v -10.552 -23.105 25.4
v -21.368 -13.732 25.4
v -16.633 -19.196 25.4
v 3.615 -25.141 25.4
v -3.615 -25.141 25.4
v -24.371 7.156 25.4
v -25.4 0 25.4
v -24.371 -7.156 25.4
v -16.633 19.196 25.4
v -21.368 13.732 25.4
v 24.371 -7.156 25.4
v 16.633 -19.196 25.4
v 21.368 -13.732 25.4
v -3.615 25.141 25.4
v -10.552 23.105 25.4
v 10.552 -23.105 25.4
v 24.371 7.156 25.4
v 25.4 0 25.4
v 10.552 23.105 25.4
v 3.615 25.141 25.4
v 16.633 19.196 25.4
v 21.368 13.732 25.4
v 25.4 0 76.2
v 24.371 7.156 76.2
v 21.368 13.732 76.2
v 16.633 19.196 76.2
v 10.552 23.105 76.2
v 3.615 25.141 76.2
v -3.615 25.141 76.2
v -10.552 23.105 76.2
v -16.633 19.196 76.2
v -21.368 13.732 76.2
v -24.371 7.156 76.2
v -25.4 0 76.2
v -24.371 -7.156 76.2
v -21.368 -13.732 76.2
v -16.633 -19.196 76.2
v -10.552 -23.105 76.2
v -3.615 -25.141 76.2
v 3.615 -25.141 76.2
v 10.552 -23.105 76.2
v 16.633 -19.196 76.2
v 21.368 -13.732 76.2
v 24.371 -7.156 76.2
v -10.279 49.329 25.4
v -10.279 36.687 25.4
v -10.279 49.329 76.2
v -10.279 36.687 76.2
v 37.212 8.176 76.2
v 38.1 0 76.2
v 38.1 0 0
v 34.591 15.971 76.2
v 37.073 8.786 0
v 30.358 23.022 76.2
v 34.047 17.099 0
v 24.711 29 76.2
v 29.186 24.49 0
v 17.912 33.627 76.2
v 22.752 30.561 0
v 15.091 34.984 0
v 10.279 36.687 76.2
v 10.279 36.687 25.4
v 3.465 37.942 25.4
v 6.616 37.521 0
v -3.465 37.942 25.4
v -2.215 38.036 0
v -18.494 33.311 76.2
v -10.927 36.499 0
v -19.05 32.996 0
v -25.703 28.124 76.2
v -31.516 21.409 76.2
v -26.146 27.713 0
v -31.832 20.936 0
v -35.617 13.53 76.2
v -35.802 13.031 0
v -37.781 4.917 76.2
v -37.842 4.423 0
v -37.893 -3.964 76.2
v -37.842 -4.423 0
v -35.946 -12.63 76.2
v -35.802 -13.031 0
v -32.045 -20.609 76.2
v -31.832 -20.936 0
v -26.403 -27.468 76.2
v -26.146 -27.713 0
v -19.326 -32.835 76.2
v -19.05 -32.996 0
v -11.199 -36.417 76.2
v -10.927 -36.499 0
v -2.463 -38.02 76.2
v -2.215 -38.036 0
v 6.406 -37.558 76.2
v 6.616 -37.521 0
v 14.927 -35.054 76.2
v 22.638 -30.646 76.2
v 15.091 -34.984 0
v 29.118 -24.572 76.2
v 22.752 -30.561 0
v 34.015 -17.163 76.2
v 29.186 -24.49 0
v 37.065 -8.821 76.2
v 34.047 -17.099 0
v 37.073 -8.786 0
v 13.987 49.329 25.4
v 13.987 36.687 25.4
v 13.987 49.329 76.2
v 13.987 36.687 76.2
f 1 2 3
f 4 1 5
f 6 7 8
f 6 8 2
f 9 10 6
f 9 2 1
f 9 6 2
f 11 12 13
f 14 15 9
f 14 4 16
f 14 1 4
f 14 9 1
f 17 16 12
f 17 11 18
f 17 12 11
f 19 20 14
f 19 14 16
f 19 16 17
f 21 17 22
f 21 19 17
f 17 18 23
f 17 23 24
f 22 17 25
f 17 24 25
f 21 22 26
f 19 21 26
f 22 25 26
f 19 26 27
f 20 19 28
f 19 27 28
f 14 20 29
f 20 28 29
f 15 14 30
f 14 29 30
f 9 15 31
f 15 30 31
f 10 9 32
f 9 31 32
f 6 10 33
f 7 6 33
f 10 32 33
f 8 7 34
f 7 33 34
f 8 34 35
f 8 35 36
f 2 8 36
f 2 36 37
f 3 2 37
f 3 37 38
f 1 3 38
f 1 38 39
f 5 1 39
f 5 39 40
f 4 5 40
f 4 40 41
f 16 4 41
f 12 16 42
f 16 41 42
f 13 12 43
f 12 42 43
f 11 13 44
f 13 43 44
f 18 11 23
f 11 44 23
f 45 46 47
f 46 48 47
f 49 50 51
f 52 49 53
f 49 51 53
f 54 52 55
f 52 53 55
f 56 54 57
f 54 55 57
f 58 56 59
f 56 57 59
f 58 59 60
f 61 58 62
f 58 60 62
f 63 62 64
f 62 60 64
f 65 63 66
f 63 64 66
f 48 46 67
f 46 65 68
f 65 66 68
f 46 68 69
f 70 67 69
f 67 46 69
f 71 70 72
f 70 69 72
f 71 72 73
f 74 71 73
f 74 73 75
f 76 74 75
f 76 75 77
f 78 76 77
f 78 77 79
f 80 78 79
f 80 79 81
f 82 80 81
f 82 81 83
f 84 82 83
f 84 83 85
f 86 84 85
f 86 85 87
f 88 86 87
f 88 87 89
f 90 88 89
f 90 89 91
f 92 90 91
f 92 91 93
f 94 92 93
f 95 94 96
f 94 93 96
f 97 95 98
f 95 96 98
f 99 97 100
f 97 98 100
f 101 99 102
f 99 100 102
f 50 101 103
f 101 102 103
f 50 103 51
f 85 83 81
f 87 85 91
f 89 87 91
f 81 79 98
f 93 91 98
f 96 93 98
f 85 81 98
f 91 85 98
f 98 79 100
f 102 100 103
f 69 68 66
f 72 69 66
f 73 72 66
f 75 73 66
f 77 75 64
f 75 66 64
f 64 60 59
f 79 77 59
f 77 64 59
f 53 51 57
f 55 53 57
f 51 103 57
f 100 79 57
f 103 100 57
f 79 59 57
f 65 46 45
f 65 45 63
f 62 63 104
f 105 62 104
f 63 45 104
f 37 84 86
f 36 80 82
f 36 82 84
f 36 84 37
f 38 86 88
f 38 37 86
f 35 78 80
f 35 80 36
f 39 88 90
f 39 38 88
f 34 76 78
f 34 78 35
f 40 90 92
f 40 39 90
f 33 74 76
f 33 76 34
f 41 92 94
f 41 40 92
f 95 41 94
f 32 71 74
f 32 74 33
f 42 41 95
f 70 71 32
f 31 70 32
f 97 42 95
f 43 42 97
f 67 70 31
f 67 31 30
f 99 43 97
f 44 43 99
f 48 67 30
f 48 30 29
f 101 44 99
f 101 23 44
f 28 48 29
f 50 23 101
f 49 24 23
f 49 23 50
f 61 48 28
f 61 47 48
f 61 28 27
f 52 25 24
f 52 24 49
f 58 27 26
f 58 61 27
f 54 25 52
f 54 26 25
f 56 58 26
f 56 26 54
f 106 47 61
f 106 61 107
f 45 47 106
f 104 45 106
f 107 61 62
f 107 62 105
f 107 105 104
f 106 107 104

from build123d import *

# Parameters (mm, degrees)
F0_R     = 38.1
F1_DEPTH = 76.2
F2_R     = 25.4
F3_DEPTH = 50.8
F4_W     = 24.265683
F4_H     = 12.642243
F5_DEPTH = 50.8


with BuildPart() as f1:
    # F0 (on Top) → F1 (new body)
    with BuildSketch(Plane.XY):
        Circle(F0_R)
    extrude(amount=F1_DEPTH)

    # F2 (on face) → F3 (cut)
    with BuildSketch(Plane.XY.offset(76.2)):
        Circle(F2_R)
    extrude(amount=-F3_DEPTH, mode=Mode.SUBTRACT)

    # F4 (on face) → F5 (join)
    with BuildSketch(Plane.XY.offset(76.2)):
        with Locations((1.853868, 43.008349)):
            Rectangle(F4_W, F4_H)
    extrude(amount=-F5_DEPTH)


solid = f1.part
